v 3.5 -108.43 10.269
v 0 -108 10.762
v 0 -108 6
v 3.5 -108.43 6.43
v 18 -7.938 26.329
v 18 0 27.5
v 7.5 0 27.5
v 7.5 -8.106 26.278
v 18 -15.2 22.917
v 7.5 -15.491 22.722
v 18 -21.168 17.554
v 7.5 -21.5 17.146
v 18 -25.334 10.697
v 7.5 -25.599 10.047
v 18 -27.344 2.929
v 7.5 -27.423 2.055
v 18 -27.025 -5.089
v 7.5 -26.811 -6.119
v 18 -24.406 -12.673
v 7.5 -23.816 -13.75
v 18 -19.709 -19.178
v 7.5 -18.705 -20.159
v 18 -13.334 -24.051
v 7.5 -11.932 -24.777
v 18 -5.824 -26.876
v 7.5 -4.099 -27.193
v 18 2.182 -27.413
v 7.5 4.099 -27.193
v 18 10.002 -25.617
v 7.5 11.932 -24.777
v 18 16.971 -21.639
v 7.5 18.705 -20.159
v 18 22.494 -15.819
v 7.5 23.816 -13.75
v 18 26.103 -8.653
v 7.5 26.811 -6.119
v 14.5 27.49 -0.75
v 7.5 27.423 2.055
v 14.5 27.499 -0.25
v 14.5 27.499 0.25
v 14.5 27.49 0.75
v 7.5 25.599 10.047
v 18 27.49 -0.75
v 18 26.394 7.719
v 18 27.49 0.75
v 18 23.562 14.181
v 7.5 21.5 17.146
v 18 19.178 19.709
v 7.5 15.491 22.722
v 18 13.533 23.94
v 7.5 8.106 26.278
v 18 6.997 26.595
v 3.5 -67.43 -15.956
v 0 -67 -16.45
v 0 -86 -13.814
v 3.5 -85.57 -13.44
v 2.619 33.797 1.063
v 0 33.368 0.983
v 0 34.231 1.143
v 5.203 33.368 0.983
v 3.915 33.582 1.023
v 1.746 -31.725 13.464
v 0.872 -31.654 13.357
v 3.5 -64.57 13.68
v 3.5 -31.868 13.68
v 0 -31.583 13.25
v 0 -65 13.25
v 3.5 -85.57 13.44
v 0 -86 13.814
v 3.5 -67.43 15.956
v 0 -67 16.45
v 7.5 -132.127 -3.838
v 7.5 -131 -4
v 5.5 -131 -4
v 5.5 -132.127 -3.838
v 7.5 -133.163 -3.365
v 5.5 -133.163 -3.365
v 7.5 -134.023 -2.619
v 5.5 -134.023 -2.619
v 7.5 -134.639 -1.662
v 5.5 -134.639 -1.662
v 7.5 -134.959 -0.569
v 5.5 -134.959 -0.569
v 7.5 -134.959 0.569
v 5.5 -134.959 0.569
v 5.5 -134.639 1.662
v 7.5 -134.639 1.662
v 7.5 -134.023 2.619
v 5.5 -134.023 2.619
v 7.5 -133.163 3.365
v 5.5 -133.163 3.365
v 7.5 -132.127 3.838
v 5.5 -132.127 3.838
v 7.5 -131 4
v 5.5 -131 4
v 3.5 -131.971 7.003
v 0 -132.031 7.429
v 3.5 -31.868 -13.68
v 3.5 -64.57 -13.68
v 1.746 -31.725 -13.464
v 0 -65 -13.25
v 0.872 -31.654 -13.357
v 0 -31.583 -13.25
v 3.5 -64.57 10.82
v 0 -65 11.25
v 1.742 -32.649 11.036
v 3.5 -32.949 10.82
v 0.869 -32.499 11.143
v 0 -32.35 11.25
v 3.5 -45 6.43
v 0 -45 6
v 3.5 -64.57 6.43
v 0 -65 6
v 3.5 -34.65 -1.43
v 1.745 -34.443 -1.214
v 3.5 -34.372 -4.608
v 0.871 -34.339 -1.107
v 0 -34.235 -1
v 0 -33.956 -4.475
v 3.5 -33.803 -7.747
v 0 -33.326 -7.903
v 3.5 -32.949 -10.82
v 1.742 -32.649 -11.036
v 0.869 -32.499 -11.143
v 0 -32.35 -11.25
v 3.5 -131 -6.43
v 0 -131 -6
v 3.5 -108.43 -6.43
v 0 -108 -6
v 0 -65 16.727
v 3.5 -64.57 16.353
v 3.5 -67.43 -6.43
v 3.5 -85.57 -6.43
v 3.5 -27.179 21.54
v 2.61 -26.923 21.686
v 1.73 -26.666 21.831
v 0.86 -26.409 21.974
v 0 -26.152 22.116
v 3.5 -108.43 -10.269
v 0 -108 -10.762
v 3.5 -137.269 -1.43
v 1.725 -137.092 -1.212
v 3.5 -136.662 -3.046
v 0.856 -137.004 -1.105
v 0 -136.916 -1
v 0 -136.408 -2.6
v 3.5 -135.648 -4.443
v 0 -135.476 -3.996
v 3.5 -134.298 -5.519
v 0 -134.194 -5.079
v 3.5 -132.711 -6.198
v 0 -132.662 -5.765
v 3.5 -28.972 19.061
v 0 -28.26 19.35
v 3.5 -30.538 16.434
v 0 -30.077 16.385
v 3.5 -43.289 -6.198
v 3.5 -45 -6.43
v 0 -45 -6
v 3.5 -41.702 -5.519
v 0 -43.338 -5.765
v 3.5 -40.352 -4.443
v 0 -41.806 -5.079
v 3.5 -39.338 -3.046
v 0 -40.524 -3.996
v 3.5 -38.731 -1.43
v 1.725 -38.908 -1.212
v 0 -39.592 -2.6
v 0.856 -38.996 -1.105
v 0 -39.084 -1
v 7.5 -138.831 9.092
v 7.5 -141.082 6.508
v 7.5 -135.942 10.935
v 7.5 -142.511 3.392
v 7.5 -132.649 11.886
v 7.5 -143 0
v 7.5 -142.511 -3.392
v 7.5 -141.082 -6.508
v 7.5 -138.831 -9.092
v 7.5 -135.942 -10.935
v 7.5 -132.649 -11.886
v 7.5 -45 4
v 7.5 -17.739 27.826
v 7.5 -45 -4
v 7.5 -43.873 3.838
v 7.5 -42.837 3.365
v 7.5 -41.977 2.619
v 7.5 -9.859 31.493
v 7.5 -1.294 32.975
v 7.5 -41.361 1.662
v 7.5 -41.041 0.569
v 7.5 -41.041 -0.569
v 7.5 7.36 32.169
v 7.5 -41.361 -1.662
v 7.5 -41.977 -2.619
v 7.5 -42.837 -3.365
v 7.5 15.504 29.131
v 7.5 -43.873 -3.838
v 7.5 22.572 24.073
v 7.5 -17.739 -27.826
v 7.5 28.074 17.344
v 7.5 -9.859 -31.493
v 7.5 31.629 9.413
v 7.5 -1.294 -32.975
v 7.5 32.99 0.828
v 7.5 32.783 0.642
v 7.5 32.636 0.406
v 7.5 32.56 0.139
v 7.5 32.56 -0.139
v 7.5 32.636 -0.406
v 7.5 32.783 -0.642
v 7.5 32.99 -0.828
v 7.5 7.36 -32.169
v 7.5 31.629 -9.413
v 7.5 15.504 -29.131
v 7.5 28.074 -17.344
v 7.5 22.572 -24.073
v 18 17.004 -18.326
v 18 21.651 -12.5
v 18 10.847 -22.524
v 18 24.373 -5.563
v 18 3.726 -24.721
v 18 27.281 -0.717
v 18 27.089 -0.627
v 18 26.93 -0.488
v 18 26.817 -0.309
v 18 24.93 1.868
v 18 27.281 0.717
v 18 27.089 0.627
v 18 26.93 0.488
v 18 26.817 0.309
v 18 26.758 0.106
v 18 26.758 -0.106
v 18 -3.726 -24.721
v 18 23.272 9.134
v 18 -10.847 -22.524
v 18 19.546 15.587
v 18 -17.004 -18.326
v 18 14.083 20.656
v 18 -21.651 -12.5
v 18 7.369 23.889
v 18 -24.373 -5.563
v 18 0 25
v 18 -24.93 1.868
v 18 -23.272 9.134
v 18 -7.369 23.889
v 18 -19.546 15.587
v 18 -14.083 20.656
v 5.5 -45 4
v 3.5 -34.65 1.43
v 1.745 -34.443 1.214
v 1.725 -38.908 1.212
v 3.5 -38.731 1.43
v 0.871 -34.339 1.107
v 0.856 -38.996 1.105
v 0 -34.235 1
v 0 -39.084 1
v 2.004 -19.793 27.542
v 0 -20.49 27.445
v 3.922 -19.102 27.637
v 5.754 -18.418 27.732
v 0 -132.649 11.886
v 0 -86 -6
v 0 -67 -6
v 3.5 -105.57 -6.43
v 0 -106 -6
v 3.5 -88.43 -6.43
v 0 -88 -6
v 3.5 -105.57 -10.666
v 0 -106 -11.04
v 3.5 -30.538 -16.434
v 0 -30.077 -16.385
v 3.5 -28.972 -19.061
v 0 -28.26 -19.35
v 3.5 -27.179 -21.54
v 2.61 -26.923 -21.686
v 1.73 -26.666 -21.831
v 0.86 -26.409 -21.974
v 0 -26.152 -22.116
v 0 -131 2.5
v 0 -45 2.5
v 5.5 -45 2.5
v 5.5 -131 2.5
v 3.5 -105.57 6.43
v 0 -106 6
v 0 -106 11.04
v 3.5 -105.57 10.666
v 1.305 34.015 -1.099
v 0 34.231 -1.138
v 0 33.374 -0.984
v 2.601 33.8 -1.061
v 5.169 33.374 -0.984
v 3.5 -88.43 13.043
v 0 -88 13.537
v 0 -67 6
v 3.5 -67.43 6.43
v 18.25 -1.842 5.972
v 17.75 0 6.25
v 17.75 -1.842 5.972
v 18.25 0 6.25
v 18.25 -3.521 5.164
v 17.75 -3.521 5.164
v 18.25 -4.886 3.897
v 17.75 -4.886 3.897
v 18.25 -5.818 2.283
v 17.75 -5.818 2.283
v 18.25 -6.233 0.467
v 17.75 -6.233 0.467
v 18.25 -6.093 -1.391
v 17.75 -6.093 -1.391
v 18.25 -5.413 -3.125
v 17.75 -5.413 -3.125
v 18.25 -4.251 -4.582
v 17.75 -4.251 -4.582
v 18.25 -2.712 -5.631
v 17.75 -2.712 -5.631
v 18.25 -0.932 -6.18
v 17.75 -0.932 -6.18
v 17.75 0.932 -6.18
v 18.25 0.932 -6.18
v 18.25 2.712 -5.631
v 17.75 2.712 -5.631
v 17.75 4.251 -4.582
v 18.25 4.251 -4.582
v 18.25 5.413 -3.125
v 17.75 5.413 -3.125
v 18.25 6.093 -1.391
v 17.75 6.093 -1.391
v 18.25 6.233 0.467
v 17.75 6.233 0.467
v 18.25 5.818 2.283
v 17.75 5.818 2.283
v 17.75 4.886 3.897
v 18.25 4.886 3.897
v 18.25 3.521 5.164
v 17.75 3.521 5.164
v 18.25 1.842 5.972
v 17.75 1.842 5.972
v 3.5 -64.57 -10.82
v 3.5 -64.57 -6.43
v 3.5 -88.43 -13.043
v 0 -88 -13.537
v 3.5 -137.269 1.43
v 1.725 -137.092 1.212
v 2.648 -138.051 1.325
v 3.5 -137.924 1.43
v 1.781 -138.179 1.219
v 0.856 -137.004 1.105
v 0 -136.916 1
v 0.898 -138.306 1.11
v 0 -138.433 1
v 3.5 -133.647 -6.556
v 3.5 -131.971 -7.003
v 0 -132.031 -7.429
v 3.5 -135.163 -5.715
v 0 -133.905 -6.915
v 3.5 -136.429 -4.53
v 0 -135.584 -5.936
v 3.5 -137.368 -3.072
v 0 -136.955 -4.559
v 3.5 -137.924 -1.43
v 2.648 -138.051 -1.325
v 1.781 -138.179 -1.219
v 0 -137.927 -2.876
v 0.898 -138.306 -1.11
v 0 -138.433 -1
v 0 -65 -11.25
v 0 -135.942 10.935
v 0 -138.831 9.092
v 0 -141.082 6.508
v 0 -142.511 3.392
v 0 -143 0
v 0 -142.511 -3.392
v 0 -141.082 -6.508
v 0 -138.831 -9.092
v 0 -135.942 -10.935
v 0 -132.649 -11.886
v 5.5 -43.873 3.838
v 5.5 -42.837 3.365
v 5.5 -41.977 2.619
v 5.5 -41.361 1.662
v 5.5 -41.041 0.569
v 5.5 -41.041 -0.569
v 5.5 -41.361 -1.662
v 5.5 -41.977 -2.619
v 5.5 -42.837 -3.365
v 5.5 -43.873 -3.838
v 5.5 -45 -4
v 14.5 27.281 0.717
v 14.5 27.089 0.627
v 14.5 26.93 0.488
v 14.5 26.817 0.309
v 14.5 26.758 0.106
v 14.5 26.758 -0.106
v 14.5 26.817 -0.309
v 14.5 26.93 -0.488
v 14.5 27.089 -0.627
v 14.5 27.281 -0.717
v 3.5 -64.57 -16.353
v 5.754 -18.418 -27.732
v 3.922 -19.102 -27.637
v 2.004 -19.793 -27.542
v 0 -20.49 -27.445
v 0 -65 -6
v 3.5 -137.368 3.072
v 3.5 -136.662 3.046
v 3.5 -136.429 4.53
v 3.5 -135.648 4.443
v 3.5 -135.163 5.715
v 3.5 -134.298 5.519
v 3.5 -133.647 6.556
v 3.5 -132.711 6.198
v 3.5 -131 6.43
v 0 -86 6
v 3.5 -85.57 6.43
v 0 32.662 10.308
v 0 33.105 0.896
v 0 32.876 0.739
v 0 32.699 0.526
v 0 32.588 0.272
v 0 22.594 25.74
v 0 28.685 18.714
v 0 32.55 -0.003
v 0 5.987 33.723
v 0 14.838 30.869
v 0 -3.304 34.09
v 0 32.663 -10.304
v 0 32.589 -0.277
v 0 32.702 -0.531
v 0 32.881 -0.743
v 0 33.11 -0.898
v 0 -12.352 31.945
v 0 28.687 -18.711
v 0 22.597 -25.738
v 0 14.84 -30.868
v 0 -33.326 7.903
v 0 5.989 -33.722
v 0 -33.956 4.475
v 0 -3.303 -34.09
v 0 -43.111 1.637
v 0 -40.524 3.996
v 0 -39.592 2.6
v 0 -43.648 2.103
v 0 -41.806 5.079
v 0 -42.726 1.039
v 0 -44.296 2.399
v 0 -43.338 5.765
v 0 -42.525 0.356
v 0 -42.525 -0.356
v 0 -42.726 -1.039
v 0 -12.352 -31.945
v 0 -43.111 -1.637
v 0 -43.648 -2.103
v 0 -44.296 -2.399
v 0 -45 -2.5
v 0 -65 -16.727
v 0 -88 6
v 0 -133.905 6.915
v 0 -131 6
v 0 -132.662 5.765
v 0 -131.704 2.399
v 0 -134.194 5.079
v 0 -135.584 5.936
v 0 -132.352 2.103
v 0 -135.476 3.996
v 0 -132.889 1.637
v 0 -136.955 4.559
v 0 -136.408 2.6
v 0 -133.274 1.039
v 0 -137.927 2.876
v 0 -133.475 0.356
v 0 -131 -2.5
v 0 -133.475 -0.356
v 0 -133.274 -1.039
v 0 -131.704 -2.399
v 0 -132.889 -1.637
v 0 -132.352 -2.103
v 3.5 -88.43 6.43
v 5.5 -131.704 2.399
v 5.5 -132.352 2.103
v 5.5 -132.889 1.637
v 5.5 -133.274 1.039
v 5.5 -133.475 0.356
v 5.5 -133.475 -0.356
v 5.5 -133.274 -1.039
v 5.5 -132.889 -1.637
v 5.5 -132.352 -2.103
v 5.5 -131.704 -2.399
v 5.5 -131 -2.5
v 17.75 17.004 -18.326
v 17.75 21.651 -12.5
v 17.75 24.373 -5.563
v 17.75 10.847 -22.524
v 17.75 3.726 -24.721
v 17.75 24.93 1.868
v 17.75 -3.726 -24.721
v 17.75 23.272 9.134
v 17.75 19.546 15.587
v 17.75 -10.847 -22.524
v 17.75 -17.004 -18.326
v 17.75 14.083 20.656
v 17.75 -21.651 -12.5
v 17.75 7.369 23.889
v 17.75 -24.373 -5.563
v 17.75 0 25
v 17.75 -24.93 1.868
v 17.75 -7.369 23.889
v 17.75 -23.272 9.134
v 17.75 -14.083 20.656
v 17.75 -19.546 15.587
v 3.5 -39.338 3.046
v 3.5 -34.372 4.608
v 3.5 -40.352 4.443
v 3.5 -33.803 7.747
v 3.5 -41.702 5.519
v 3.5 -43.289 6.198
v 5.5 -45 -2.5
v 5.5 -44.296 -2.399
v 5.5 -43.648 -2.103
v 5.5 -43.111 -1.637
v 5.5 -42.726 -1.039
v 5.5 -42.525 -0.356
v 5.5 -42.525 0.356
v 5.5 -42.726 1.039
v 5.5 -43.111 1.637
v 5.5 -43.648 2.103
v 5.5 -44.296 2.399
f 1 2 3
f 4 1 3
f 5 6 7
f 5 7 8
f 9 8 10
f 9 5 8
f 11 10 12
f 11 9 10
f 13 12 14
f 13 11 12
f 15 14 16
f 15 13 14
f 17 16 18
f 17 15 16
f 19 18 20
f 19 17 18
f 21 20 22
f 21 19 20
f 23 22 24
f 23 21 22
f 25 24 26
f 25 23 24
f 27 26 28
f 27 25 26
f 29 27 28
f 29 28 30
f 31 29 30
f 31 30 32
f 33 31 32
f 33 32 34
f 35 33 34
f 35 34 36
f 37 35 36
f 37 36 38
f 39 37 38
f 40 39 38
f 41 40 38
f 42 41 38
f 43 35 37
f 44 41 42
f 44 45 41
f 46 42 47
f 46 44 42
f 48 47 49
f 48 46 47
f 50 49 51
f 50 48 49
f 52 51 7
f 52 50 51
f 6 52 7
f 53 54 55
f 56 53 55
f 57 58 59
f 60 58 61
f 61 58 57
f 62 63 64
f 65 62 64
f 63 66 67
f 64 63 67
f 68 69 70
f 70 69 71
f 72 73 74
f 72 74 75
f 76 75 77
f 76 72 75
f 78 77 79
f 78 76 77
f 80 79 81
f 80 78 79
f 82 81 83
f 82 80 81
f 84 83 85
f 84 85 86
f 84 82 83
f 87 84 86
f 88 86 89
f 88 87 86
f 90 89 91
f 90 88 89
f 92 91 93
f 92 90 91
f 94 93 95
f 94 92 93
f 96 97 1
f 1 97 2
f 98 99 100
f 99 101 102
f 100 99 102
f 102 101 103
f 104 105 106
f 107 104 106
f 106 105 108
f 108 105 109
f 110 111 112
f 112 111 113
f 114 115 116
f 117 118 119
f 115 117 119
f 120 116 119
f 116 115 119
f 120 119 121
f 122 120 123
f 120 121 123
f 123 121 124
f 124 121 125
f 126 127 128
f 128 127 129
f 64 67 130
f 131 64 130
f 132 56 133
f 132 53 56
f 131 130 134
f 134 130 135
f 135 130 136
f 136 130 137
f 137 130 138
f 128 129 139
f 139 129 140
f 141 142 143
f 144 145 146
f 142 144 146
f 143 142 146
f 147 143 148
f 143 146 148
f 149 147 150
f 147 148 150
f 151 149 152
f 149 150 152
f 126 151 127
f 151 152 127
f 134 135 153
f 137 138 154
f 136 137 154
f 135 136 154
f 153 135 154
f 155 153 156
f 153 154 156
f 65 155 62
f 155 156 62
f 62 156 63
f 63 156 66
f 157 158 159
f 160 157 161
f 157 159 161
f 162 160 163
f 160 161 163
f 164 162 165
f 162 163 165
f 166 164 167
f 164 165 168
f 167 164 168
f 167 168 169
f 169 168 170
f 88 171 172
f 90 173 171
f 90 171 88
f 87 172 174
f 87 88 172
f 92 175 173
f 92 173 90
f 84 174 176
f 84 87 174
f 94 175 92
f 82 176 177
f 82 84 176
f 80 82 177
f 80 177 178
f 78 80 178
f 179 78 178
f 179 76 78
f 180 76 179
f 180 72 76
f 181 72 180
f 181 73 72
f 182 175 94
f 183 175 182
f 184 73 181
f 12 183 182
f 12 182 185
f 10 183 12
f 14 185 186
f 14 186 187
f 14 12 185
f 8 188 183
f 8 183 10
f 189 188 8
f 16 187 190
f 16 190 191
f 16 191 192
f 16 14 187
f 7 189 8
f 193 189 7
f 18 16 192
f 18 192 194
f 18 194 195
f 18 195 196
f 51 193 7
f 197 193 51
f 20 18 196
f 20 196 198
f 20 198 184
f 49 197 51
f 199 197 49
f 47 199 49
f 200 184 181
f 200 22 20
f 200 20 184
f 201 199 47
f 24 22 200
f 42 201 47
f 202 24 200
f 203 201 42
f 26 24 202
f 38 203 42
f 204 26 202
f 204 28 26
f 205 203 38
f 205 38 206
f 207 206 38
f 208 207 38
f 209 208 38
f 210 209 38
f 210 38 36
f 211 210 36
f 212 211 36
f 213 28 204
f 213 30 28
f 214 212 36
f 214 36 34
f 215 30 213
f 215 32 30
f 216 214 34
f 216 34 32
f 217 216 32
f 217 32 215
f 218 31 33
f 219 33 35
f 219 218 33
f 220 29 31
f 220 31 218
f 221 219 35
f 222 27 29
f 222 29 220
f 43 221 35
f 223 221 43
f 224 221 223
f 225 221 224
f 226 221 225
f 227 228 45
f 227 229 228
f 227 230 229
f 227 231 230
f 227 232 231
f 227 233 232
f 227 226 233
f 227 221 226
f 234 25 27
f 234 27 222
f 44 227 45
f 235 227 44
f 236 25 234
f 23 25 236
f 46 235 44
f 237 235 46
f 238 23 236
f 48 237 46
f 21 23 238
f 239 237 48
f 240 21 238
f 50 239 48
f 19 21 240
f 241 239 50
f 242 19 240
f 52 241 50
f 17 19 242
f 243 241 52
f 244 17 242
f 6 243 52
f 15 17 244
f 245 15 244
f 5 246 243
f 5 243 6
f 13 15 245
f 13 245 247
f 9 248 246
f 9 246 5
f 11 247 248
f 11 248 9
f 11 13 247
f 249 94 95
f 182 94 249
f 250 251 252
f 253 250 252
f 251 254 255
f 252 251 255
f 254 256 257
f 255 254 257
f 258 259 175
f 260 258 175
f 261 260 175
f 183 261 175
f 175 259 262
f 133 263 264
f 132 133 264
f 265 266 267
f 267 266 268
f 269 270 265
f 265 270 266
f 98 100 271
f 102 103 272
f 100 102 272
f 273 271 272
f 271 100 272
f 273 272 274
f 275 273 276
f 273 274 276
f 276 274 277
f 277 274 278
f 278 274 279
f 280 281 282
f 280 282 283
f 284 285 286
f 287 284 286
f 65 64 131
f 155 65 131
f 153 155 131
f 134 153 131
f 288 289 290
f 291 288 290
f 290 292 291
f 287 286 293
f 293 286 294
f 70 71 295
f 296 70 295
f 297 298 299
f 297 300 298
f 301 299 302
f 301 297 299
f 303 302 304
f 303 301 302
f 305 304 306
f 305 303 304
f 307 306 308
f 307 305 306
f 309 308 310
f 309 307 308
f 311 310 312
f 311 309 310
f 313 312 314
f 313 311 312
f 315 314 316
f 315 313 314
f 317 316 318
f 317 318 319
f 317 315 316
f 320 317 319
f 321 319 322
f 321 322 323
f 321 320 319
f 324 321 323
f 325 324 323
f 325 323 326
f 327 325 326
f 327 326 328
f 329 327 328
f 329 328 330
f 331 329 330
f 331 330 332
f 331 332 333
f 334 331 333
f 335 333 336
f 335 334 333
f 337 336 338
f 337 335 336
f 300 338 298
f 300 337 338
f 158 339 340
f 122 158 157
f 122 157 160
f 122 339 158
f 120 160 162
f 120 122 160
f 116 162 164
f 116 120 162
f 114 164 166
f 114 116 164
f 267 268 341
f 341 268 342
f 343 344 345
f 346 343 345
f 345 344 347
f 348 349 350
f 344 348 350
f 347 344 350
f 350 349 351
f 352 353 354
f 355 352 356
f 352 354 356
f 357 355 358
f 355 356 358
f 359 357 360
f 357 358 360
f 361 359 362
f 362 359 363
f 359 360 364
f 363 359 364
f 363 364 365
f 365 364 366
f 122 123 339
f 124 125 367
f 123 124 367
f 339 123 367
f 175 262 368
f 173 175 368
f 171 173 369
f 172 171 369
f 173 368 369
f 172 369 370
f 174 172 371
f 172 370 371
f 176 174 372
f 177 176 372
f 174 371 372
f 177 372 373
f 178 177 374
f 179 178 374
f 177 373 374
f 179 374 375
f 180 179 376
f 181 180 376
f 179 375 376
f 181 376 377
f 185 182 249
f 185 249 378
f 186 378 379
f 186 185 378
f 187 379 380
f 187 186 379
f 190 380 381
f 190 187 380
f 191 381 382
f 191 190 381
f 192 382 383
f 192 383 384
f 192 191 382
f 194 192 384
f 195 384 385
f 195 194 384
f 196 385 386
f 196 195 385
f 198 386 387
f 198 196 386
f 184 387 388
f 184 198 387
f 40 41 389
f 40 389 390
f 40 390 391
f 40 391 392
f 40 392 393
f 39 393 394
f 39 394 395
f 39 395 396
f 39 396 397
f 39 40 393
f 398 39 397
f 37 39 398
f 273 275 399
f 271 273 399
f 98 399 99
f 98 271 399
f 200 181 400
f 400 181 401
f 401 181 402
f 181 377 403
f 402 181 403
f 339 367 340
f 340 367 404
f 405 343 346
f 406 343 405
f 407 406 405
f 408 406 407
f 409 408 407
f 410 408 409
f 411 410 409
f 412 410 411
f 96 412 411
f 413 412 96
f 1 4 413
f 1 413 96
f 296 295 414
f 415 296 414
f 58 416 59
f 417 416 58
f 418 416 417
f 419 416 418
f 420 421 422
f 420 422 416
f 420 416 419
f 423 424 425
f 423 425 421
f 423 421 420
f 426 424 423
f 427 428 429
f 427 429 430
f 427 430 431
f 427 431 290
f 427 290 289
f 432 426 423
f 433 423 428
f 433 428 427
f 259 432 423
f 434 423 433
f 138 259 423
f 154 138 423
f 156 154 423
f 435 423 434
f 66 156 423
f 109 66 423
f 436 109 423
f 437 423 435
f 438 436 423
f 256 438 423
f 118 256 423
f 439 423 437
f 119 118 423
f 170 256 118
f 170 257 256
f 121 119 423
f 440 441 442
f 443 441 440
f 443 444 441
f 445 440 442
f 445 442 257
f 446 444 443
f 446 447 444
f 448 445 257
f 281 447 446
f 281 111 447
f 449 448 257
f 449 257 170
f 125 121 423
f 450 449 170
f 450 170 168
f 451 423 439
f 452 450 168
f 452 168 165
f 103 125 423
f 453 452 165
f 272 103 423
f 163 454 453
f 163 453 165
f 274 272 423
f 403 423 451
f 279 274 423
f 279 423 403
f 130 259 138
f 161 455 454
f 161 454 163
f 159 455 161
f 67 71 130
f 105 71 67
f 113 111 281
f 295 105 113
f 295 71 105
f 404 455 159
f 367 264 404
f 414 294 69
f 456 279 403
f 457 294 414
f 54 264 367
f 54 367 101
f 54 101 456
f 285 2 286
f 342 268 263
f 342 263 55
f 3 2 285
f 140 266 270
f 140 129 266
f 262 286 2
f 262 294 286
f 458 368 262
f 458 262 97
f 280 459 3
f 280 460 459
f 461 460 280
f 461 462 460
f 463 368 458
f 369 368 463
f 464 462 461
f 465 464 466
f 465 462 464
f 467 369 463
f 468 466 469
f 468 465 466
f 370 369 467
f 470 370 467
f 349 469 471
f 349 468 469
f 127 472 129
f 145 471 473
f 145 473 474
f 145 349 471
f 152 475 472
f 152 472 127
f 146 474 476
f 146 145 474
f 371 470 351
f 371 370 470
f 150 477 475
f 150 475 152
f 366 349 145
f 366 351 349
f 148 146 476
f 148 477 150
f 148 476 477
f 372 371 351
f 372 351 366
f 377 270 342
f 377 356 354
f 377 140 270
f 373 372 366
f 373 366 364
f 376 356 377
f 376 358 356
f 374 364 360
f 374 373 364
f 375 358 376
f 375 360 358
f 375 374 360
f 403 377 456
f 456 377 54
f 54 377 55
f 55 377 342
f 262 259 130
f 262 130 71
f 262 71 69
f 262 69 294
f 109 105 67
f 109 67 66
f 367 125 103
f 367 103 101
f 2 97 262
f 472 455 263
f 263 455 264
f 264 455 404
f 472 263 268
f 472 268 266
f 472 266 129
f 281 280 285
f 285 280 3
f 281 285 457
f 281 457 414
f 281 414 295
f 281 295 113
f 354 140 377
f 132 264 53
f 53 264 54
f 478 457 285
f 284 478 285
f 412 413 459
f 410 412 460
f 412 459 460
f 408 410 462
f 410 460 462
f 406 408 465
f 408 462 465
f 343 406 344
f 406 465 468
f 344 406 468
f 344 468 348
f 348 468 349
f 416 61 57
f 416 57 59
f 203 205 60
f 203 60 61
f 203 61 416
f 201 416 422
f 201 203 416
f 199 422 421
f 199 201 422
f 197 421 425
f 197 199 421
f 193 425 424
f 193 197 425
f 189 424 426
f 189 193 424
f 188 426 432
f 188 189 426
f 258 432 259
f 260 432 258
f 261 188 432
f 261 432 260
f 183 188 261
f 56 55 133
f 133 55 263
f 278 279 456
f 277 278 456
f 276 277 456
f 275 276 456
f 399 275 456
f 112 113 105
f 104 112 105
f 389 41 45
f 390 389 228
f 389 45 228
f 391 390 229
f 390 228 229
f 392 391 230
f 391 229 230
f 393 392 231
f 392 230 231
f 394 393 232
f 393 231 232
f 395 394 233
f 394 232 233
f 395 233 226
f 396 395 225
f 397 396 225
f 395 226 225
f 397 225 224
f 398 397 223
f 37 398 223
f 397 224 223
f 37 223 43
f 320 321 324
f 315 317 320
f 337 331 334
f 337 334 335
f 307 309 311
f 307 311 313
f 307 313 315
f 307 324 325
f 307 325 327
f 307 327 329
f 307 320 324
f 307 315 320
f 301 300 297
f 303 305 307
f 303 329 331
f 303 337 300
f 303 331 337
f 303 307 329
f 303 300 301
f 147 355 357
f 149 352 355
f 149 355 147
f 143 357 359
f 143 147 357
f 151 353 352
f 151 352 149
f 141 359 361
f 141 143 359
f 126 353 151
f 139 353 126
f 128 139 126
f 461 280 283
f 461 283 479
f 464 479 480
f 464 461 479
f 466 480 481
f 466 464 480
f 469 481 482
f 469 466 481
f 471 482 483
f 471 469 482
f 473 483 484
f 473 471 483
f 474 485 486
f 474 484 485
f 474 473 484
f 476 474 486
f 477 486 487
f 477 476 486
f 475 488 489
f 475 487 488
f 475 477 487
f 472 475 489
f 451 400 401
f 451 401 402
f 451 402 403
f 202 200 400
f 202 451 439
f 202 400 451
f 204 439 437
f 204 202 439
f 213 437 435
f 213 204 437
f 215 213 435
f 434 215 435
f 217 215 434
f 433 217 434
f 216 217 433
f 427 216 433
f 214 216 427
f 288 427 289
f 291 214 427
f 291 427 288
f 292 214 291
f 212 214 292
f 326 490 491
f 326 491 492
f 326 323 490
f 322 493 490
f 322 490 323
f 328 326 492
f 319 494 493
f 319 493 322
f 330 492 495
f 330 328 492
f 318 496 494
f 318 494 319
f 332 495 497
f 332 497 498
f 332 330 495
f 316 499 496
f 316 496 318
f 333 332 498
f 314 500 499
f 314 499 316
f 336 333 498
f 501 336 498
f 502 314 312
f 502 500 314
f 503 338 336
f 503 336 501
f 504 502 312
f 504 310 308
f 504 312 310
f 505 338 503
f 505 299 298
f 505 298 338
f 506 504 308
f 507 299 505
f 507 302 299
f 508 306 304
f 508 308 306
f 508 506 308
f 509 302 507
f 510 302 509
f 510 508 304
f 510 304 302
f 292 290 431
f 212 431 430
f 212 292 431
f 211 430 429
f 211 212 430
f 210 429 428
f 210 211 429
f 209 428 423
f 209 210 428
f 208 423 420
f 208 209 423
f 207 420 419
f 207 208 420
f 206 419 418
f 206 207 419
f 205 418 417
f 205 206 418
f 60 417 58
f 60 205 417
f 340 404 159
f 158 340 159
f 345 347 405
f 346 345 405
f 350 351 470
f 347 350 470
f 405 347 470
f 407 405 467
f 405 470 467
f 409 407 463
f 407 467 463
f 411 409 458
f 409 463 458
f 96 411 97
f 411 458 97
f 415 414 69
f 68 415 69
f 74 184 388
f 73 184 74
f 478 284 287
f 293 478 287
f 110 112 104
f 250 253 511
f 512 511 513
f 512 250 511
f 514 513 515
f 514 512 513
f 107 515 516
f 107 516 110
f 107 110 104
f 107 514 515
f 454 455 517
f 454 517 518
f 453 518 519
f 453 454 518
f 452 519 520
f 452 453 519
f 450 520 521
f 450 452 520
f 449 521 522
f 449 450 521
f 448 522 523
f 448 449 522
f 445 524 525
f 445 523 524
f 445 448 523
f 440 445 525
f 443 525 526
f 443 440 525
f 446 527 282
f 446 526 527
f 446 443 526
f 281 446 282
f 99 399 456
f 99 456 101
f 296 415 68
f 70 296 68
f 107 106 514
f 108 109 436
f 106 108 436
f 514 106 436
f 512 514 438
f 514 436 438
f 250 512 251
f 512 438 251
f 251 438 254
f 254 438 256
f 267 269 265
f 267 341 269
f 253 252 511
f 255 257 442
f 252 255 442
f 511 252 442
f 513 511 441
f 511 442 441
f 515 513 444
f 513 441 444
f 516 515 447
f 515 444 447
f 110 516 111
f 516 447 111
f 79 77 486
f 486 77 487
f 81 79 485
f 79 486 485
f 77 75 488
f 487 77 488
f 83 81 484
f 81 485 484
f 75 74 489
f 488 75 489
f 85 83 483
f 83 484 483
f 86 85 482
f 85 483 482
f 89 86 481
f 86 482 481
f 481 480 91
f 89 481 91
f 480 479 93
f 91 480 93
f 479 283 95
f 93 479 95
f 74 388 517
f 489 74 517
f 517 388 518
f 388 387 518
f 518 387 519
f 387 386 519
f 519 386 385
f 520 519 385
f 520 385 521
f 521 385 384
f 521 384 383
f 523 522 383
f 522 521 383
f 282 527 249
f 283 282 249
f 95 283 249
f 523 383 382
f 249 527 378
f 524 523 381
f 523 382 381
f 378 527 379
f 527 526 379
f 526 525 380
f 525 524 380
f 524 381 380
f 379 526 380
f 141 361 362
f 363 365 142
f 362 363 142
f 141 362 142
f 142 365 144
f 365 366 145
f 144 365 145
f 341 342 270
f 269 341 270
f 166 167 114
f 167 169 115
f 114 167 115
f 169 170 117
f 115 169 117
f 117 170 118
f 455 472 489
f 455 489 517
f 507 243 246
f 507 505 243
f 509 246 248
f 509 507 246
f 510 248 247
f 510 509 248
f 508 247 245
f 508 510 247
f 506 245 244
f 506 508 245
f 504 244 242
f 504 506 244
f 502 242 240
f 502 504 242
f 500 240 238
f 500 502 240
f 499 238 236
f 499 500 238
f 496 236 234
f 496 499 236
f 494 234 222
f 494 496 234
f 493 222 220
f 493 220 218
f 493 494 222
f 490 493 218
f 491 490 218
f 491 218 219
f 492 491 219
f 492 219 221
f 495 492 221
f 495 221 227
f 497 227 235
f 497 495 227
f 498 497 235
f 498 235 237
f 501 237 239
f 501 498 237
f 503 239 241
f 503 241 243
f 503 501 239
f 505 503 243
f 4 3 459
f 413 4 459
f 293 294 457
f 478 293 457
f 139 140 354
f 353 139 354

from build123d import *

# Parameters (mm, degrees)
ESQUISSE2_R                        = 0.75
ENL_V_MAT_EXTRU_1_DEPTH            = 3.5
ENL_V_MAT_EXTRU_2_DEPTH            = 50.615395796
EXTRUSION1_DEPTH                   = 7.5
ENL_V_MAT_EXTRU_3_DEPTH            = 3.5
ENL_V_MAT_EXTRU_3_DRAFT            = -7
ENL_V_MAT_EXTRU_3_PROFILE_2_DEPTH  = 3.5
ENL_V_MAT_EXTRU_3_PROFILE_2_DRAFT  = -7
ENL_V_MAT_EXTRU_3_PROFILE_3_DEPTH  = 3.5
ENL_V_MAT_EXTRU_3_PROFILE_3_DRAFT  = -7
ENL_V_MAT_EXTRU_3_PROFILE_4_DEPTH  = 3.5
ENL_V_MAT_EXTRU_3_PROFILE_4_DRAFT  = -7
ENL_V_MAT_EXTRU_3_PROFILE_5_DEPTH  = 3.5
ENL_V_MAT_EXTRU_3_PROFILE_5_DRAFT  = -7
ENL_V_MAT_EXTRU_3_PROFILE_6_DEPTH  = 3.5
ENL_V_MAT_EXTRU_3_PROFILE_6_DRAFT  = -7
ENL_V_MAT_EXTRU_3_PROFILE_7_DEPTH  = 3.5
ENL_V_MAT_EXTRU_3_PROFILE_7_DRAFT  = -7
ENL_V_MAT_EXTRU_3_PROFILE_8_DEPTH  = 3.5
ENL_V_MAT_EXTRU_3_PROFILE_8_DRAFT  = -7
ENL_V_MAT_EXTRU_3_PROFILE_9_DEPTH  = 3.5
ENL_V_MAT_EXTRU_3_PROFILE_9_DRAFT  = -7
ENL_V_MAT_EXTRU_3_PROFILE_10_DEPTH = 3.5
ENL_V_MAT_EXTRU_3_PROFILE_10_DRAFT = -7
ENL_V_MAT_EXTRU_4_DEPTH            = 2


with BuildPart() as part:
    # Esquisse1 → Révolution1 (revolve)
    with BuildSketch(Plane.XY, mode=Mode.PRIVATE) as r_volution1_sk:
        Polygon((0, 0), (0, 34.25), (7.5, 33), (7.5, 27.5), (18, 27.5), (18, 25), (17.75, 25), (17.75, 6.25), (18.25, 6.25), (18.25, 0), align=None)
    revolve(r_volution1_sk.sketch.rotate(Axis((-40.966877637, 0, 0), (1, 0, 0)), 90), axis=Axis((-40.966877637, 0, 0), (1, 0, 0)))

    # Esquisse2 → Enlèv. mat.-Extru.1 (cut)
    with BuildSketch(Plane(origin=(18, 0, 0), x_dir=(0, 0, -1), z_dir=(1, 0, 0))):
        with Locations((0, 27.5)):
            Circle(ESQUISSE2_R)
    extrude(amount=-ENL_V_MAT_EXTRU_1_DEPTH, mode=Mode.SUBTRACT)

    # Esquisse3 → Enlèv. mat.-Extru.2 (cut, through all)
    with BuildSketch(Plane(origin=(7.5, 0, 0), x_dir=(0, 0, -1), z_dir=(1, 0, 0))):
        with BuildLine():
            Line((-0.983364169, 33.368354985), (-1.997654411, 38.859376491))
            Line((-1.997654411, 38.859376491), (1.964936251, 38.859376491))
            Line((1.964936251, 38.859376491), (0.984396051, 33.374032918))
            ThreePointArc((0.984396051, 33.374032918), (0.002885468, 32.550004163), (-0.983364169, 33.368354985))
        make_face()
    extrude(amount=-ENL_V_MAT_EXTRU_2_DEPTH, mode=Mode.SUBTRACT)

    # Esquisse4 → Extrusion1 (add)
    with BuildSketch(Plane.ZY):
        with BuildLine():
            Line((29.715450244, -4.122137405), (11.886180098, -132.648854962))
            ThreePointArc((11.886180098, -132.648854962), (0, -143), (-11.886180098, -132.648854962))
            Line((-11.886180098, -132.648854962), (-29.715450244, -4.122137405))
            ThreePointArc((-29.715450244, -4.122137405), (0, 30), (29.715450244, -4.122137405))
        make_face()
        with BuildLine():
            Line((2.5, -45), (2.5, -131))
            ThreePointArc((2.5, -131), (0, -133.5), (-2.5, -131))
            Line((-2.5, -131), (-2.5, -45))
            ThreePointArc((-2.5, -45), (0, -42.5), (2.5, -45))
        make_face(mode=Mode.SUBTRACT)
    extrude(amount=-EXTRUSION1_DEPTH)


with BuildPart() as enl_v_mat_extru_3_tool:
    # Esquisse5 → Enlèv. mat.-Extru.3 (with draft: the straight prism first)
    with BuildSketch(Plane.ZY):
        Polygon((-11.039827175, -106), (-6, -106), (-6, -88), (-13.536793321, -88), align=None)
    extrude(amount=-ENL_V_MAT_EXTRU_3_DEPTH)
    # Enlèv. mat.-Extru.3: the draft: its side faces are tilted about the plane it starts from
    enl_v_mat_extru_3_sides = [enl_v_mat_extru_3_tool.faces().sort_by_distance(p)[0] for p in [
        (1.75, -106, -8.519913587),
        (1.75, -97, -6),
        (1.75, -88, -9.768396661),
        (1.75, -97, -12.288310248),
    ]]
    draft(enl_v_mat_extru_3_sides, Plane.ZY, ENL_V_MAT_EXTRU_3_DRAFT)


with BuildPart() as part_1:
    add(part.part)

    # Enlèv. mat.-Extru.3: cut by enl_v_mat_extru_3_tool
    add(enl_v_mat_extru_3_tool.part, mode=Mode.SUBTRACT)


with BuildPart() as enl_v_mat_extru_3_profile_2_tool:
    # Esquisse5 → Enlèv. mat.-Extru.3 profile 2 (with draft: the straight prism first)
    with BuildSketch(Plane.ZY):
        with BuildLine():
            ThreePointArc((-6, -45), (-4.582575695, -41.127016654), (-1, -39.083920217))
            Line((-1, -39.083920217), (-1, -34.235398347))
            ThreePointArc((-1, -34.235398347), (-6.197147295, -33.684682949), (-11.25, -32.349652239))
            Line((-11.25, -32.349652239), (-11.25, -65))
            Line((-11.25, -65), (-6, -65))
            Line((-6, -65), (-6, -45))
        make_face()
    extrude(amount=-ENL_V_MAT_EXTRU_3_PROFILE_2_DEPTH)
    # Enlèv. mat.-Extru.3 profile 2: the draft: its side faces are tilted about the plane it starts from
    enl_v_mat_extru_3_profile_2_sides = [enl_v_mat_extru_3_profile_2_tool.faces().sort_by_distance(p)[0] for p in [
        (1.75, -41.127016654, -4.582575695),
        (1.75, -36.659659282, -1),
        (1.75, -33.684682949, -6.197147295),
        (1.75, -48.67482612, -11.25),
        (1.75, -65, -8.625),
        (1.75, -55, -6),
    ]]
    draft(enl_v_mat_extru_3_profile_2_sides, Plane.ZY, ENL_V_MAT_EXTRU_3_PROFILE_2_DRAFT)


with BuildPart() as part_2:
    add(part_1.part)

    # Enlèv. mat.-Extru.3 profile 2: cut by enl_v_mat_extru_3_profile_2_tool
    add(enl_v_mat_extru_3_profile_2_tool.part, mode=Mode.SUBTRACT)


with BuildPart() as enl_v_mat_extru_3_profile_3_tool:
    # Esquisse5 → Enlèv. mat.-Extru.3 profile 3 (with draft: the straight prism first)
    with BuildSketch(Plane.ZY):
        with BuildLine():
            Line((-22.116364137, -26.152035052), (-16.727361175, -65))
            Line((-16.727361175, -65), (-13.25, -65))
            Line((-13.25, -65), (-13.25, -31.583223395))
            ThreePointArc((-13.25, -31.583223395), (-17.890482939, -29.206045953), (-22.116364137, -26.152035052))
        make_face()
    extrude(amount=-ENL_V_MAT_EXTRU_3_PROFILE_3_DEPTH)
    # Enlèv. mat.-Extru.3 profile 3: the draft: its side faces are tilted about the plane it starts from
    enl_v_mat_extru_3_profile_3_sides = [enl_v_mat_extru_3_profile_3_tool.faces().sort_by_distance(p)[0] for p in [
        (1.75, -45.576017526, -19.421862656),
        (1.75, -65, -14.988680587),
        (1.75, -48.291611697, -13.25),
        (1.75, -29.206045953, -17.890482939),
    ]]
    draft(enl_v_mat_extru_3_profile_3_sides, Plane.ZY, ENL_V_MAT_EXTRU_3_PROFILE_3_DRAFT)


with BuildPart() as part_3:
    add(part_2.part)

    # Enlèv. mat.-Extru.3 profile 3: cut by enl_v_mat_extru_3_profile_3_tool
    add(enl_v_mat_extru_3_profile_3_tool.part, mode=Mode.SUBTRACT)


with BuildPart() as enl_v_mat_extru_3_profile_4_tool:
    # Esquisse5 → Enlèv. mat.-Extru.3 profile 4 (with draft: the straight prism first)
    with BuildSketch(Plane.ZY):
        with BuildLine():
            Line((-1, -138.433034374), (-1, -136.916079783))
            ThreePointArc((-1, -136.916079783), (-4.582575695, -134.872983346), (-6, -131))
            Line((-6, -131), (-6, -108))
            Line((-6, -108), (-10.762386492, -108))
            Line((-10.762386492, -108), (-7.428862561, -132.030534351))
            ThreePointArc((-7.428862561, -132.030534351), (-5.292393849, -136.314185483), (-1, -138.433034374))
        make_face()
    extrude(amount=-ENL_V_MAT_EXTRU_3_PROFILE_4_DEPTH)
    # Enlèv. mat.-Extru.3 profile 4: the draft: its side faces are tilted about the plane it starts from
    enl_v_mat_extru_3_profile_4_sides = [enl_v_mat_extru_3_profile_4_tool.faces().sort_by_distance(p)[0] for p in [
        (1.75, -137.674557078, -1),
        (1.75, -134.872983346, -4.582575695),
        (1.75, -119.5, -6),
        (1.75, -108, -8.381193246),
        (1.75, -120.015267176, -9.095624526),
        (1.75, -136.314185483, -5.292393849),
    ]]
    draft(enl_v_mat_extru_3_profile_4_sides, Plane.ZY, ENL_V_MAT_EXTRU_3_PROFILE_4_DRAFT)


with BuildPart() as part_4:
    add(part_3.part)

    # Enlèv. mat.-Extru.3 profile 4: cut by enl_v_mat_extru_3_profile_4_tool
    add(enl_v_mat_extru_3_profile_4_tool.part, mode=Mode.SUBTRACT)


with BuildPart() as enl_v_mat_extru_3_profile_5_tool:
    # Esquisse5 → Enlèv. mat.-Extru.3 profile 5 (with draft: the straight prism first)
    with BuildSketch(Plane.ZY):
        Polygon((-13.814234004, -86), (-6, -86), (-6, -67), (-16.449920492, -67), align=None)
    extrude(amount=-ENL_V_MAT_EXTRU_3_PROFILE_5_DEPTH)
    # Enlèv. mat.-Extru.3 profile 5: the draft: its side faces are tilted about the plane it starts from
    enl_v_mat_extru_3_profile_5_sides = [enl_v_mat_extru_3_profile_5_tool.faces().sort_by_distance(p)[0] for p in [
        (1.75, -86, -9.907117002),
        (1.75, -76.5, -6),
        (1.75, -67, -11.224960246),
        (1.75, -76.5, -15.132077248),
    ]]
    draft(enl_v_mat_extru_3_profile_5_sides, Plane.ZY, ENL_V_MAT_EXTRU_3_PROFILE_5_DRAFT)


with BuildPart() as part_5:
    add(part_4.part)

    # Enlèv. mat.-Extru.3 profile 5: cut by enl_v_mat_extru_3_profile_5_tool
    add(enl_v_mat_extru_3_profile_5_tool.part, mode=Mode.SUBTRACT)


with BuildPart() as enl_v_mat_extru_3_profile_6_tool:
    # Esquisse5 → Enlèv. mat.-Extru.3 profile 6 (with draft: the straight prism first)
    with BuildSketch(Plane.ZY):
        with BuildLine():
            Line((10.762386492, -108), (6, -108))
            Line((6, -108), (6, -131))
            ThreePointArc((6, -131), (4.582575695, -134.872983346), (1, -136.916079783))
            Line((1, -136.916079783), (1, -138.433034374))
            ThreePointArc((1, -138.433034374), (5.292393849, -136.314185483), (7.428862561, -132.030534351))
            Line((7.428862561, -132.030534351), (10.762386492, -108))
        make_face()
    extrude(amount=-ENL_V_MAT_EXTRU_3_PROFILE_6_DEPTH)
    # Enlèv. mat.-Extru.3 profile 6: the draft: its side faces are tilted about the plane it starts from
    enl_v_mat_extru_3_profile_6_sides = [enl_v_mat_extru_3_profile_6_tool.faces().sort_by_distance(p)[0] for p in [
        (1.75, -120.015267176, 9.095624526),
        (1.75, -108, 8.381193246),
        (1.75, -119.5, 6),
        (1.75, -134.872983346, 4.582575695),
        (1.75, -137.674557078, 1),
        (1.75, -136.314185483, 5.292393849),
    ]]
    draft(enl_v_mat_extru_3_profile_6_sides, Plane.ZY, ENL_V_MAT_EXTRU_3_PROFILE_6_DRAFT)


with BuildPart() as part_6:
    add(part_5.part)

    # Enlèv. mat.-Extru.3 profile 6: cut by enl_v_mat_extru_3_profile_6_tool
    add(enl_v_mat_extru_3_profile_6_tool.part, mode=Mode.SUBTRACT)


with BuildPart() as enl_v_mat_extru_3_profile_7_tool:
    # Esquisse5 → Enlèv. mat.-Extru.3 profile 7 (with draft: the straight prism first)
    with BuildSketch(Plane.ZY):
        Polygon((13.536793321, -88), (6, -88), (6, -106), (11.039827175, -106), align=None)
    extrude(amount=-ENL_V_MAT_EXTRU_3_PROFILE_7_DEPTH)
    # Enlèv. mat.-Extru.3 profile 7: the draft: its side faces are tilted about the plane it starts from
    enl_v_mat_extru_3_profile_7_sides = [enl_v_mat_extru_3_profile_7_tool.faces().sort_by_distance(p)[0] for p in [
        (1.75, -88, 9.768396661),
        (1.75, -97, 6),
        (1.75, -106, 8.519913587),
        (1.75, -97, 12.288310248),
    ]]
    draft(enl_v_mat_extru_3_profile_7_sides, Plane.ZY, ENL_V_MAT_EXTRU_3_PROFILE_7_DRAFT)


with BuildPart() as part_7:
    add(part_6.part)

    # Enlèv. mat.-Extru.3 profile 7: cut by enl_v_mat_extru_3_profile_7_tool
    add(enl_v_mat_extru_3_profile_7_tool.part, mode=Mode.SUBTRACT)


with BuildPart() as enl_v_mat_extru_3_profile_8_tool:
    # Esquisse5 → Enlèv. mat.-Extru.3 profile 8 (with draft: the straight prism first)
    with BuildSketch(Plane.ZY):
        with BuildLine():
            Line((11.25, -65), (11.25, -32.349652239))
            ThreePointArc((11.25, -32.349652239), (6.197147295, -33.684682949), (1, -34.235398347))
            Line((1, -34.235398347), (1, -39.083920217))
            ThreePointArc((1, -39.083920217), (4.582575695, -41.127016654), (6, -45))
            Line((6, -45), (6, -65))
            Line((6, -65), (11.25, -65))
        make_face()
    extrude(amount=-ENL_V_MAT_EXTRU_3_PROFILE_8_DEPTH)
    # Enlèv. mat.-Extru.3 profile 8: the draft: its side faces are tilted about the plane it starts from
    enl_v_mat_extru_3_profile_8_sides = [enl_v_mat_extru_3_profile_8_tool.faces().sort_by_distance(p)[0] for p in [
        (1.75, -55, 6),
        (1.75, -65, 8.625),
        (1.75, -48.67482612, 11.25),
        (1.75, -33.684682949, 6.197147295),
        (1.75, -36.659659282, 1),
        (1.75, -41.127016654, 4.582575695),
    ]]
    draft(enl_v_mat_extru_3_profile_8_sides, Plane.ZY, ENL_V_MAT_EXTRU_3_PROFILE_8_DRAFT)


with BuildPart() as part_8:
    add(part_7.part)

    # Enlèv. mat.-Extru.3 profile 8: cut by enl_v_mat_extru_3_profile_8_tool
    add(enl_v_mat_extru_3_profile_8_tool.part, mode=Mode.SUBTRACT)


with BuildPart() as enl_v_mat_extru_3_profile_9_tool:
    # Esquisse5 → Enlèv. mat.-Extru.3 profile 9 (with draft: the straight prism first)
    with BuildSketch(Plane.ZY):
        Polygon((6, -67), (6, -86), (13.814234004, -86), (16.449920492, -67), align=None)
    extrude(amount=-ENL_V_MAT_EXTRU_3_PROFILE_9_DEPTH)
    # Enlèv. mat.-Extru.3 profile 9: the draft: its side faces are tilted about the plane it starts from
    enl_v_mat_extru_3_profile_9_sides = [enl_v_mat_extru_3_profile_9_tool.faces().sort_by_distance(p)[0] for p in [
        (1.75, -76.5, 6),
        (1.75, -86, 9.907117002),
        (1.75, -76.5, 15.132077248),
        (1.75, -67, 11.224960246),
    ]]
    draft(enl_v_mat_extru_3_profile_9_sides, Plane.ZY, ENL_V_MAT_EXTRU_3_PROFILE_9_DRAFT)


with BuildPart() as part_9:
    add(part_8.part)

    # Enlèv. mat.-Extru.3 profile 9: cut by enl_v_mat_extru_3_profile_9_tool
    add(enl_v_mat_extru_3_profile_9_tool.part, mode=Mode.SUBTRACT)


with BuildPart() as enl_v_mat_extru_3_profile_10_tool:
    # Esquisse5 → Enlèv. mat.-Extru.3 profile 10 (with draft: the straight prism first)
    with BuildSketch(Plane.ZY):
        with BuildLine():
            Line((13.25, -65), (16.727361175, -65))
            Line((16.727361175, -65), (22.116364137, -26.152035052))
            ThreePointArc((22.116364137, -26.152035052), (17.890482939, -29.206045953), (13.25, -31.583223395))
            Line((13.25, -31.583223395), (13.25, -65))
        make_face()
    extrude(amount=-ENL_V_MAT_EXTRU_3_PROFILE_10_DEPTH)
    # Enlèv. mat.-Extru.3 profile 10: the draft: its side faces are tilted about the plane it starts from
    enl_v_mat_extru_3_profile_10_sides = [enl_v_mat_extru_3_profile_10_tool.faces().sort_by_distance(p)[0] for p in [
        (1.75, -48.291611697, 13.25),
        (1.75, -65, 14.988680587),
        (1.75, -45.576017526, 19.421862656),
        (1.75, -29.206045953, 17.890482939),
    ]]
    draft(enl_v_mat_extru_3_profile_10_sides, Plane.ZY, ENL_V_MAT_EXTRU_3_PROFILE_10_DRAFT)


with BuildPart() as part_10:
    add(part_9.part)

    # Enlèv. mat.-Extru.3 profile 10: cut by enl_v_mat_extru_3_profile_10_tool
    add(enl_v_mat_extru_3_profile_10_tool.part, mode=Mode.SUBTRACT)

    # Esquisse6 → Enlèv. mat.-Extru.4 (cut)
    with BuildSketch(Plane(origin=(7.5, 0, 0), x_dir=(0, 0, -1), z_dir=(1, 0, 0))):
        with BuildLine():
            Line((4, -45), (4, -131))
            ThreePointArc((4, -131), (0, -135), (-4, -131))
            Line((-4, -131), (-4, -45))
            ThreePointArc((-4, -45), (0, -41), (4, -45))
        make_face()
    extrude(amount=-ENL_V_MAT_EXTRU_4_DEPTH, mode=Mode.SUBTRACT)


solid = part_10.part
